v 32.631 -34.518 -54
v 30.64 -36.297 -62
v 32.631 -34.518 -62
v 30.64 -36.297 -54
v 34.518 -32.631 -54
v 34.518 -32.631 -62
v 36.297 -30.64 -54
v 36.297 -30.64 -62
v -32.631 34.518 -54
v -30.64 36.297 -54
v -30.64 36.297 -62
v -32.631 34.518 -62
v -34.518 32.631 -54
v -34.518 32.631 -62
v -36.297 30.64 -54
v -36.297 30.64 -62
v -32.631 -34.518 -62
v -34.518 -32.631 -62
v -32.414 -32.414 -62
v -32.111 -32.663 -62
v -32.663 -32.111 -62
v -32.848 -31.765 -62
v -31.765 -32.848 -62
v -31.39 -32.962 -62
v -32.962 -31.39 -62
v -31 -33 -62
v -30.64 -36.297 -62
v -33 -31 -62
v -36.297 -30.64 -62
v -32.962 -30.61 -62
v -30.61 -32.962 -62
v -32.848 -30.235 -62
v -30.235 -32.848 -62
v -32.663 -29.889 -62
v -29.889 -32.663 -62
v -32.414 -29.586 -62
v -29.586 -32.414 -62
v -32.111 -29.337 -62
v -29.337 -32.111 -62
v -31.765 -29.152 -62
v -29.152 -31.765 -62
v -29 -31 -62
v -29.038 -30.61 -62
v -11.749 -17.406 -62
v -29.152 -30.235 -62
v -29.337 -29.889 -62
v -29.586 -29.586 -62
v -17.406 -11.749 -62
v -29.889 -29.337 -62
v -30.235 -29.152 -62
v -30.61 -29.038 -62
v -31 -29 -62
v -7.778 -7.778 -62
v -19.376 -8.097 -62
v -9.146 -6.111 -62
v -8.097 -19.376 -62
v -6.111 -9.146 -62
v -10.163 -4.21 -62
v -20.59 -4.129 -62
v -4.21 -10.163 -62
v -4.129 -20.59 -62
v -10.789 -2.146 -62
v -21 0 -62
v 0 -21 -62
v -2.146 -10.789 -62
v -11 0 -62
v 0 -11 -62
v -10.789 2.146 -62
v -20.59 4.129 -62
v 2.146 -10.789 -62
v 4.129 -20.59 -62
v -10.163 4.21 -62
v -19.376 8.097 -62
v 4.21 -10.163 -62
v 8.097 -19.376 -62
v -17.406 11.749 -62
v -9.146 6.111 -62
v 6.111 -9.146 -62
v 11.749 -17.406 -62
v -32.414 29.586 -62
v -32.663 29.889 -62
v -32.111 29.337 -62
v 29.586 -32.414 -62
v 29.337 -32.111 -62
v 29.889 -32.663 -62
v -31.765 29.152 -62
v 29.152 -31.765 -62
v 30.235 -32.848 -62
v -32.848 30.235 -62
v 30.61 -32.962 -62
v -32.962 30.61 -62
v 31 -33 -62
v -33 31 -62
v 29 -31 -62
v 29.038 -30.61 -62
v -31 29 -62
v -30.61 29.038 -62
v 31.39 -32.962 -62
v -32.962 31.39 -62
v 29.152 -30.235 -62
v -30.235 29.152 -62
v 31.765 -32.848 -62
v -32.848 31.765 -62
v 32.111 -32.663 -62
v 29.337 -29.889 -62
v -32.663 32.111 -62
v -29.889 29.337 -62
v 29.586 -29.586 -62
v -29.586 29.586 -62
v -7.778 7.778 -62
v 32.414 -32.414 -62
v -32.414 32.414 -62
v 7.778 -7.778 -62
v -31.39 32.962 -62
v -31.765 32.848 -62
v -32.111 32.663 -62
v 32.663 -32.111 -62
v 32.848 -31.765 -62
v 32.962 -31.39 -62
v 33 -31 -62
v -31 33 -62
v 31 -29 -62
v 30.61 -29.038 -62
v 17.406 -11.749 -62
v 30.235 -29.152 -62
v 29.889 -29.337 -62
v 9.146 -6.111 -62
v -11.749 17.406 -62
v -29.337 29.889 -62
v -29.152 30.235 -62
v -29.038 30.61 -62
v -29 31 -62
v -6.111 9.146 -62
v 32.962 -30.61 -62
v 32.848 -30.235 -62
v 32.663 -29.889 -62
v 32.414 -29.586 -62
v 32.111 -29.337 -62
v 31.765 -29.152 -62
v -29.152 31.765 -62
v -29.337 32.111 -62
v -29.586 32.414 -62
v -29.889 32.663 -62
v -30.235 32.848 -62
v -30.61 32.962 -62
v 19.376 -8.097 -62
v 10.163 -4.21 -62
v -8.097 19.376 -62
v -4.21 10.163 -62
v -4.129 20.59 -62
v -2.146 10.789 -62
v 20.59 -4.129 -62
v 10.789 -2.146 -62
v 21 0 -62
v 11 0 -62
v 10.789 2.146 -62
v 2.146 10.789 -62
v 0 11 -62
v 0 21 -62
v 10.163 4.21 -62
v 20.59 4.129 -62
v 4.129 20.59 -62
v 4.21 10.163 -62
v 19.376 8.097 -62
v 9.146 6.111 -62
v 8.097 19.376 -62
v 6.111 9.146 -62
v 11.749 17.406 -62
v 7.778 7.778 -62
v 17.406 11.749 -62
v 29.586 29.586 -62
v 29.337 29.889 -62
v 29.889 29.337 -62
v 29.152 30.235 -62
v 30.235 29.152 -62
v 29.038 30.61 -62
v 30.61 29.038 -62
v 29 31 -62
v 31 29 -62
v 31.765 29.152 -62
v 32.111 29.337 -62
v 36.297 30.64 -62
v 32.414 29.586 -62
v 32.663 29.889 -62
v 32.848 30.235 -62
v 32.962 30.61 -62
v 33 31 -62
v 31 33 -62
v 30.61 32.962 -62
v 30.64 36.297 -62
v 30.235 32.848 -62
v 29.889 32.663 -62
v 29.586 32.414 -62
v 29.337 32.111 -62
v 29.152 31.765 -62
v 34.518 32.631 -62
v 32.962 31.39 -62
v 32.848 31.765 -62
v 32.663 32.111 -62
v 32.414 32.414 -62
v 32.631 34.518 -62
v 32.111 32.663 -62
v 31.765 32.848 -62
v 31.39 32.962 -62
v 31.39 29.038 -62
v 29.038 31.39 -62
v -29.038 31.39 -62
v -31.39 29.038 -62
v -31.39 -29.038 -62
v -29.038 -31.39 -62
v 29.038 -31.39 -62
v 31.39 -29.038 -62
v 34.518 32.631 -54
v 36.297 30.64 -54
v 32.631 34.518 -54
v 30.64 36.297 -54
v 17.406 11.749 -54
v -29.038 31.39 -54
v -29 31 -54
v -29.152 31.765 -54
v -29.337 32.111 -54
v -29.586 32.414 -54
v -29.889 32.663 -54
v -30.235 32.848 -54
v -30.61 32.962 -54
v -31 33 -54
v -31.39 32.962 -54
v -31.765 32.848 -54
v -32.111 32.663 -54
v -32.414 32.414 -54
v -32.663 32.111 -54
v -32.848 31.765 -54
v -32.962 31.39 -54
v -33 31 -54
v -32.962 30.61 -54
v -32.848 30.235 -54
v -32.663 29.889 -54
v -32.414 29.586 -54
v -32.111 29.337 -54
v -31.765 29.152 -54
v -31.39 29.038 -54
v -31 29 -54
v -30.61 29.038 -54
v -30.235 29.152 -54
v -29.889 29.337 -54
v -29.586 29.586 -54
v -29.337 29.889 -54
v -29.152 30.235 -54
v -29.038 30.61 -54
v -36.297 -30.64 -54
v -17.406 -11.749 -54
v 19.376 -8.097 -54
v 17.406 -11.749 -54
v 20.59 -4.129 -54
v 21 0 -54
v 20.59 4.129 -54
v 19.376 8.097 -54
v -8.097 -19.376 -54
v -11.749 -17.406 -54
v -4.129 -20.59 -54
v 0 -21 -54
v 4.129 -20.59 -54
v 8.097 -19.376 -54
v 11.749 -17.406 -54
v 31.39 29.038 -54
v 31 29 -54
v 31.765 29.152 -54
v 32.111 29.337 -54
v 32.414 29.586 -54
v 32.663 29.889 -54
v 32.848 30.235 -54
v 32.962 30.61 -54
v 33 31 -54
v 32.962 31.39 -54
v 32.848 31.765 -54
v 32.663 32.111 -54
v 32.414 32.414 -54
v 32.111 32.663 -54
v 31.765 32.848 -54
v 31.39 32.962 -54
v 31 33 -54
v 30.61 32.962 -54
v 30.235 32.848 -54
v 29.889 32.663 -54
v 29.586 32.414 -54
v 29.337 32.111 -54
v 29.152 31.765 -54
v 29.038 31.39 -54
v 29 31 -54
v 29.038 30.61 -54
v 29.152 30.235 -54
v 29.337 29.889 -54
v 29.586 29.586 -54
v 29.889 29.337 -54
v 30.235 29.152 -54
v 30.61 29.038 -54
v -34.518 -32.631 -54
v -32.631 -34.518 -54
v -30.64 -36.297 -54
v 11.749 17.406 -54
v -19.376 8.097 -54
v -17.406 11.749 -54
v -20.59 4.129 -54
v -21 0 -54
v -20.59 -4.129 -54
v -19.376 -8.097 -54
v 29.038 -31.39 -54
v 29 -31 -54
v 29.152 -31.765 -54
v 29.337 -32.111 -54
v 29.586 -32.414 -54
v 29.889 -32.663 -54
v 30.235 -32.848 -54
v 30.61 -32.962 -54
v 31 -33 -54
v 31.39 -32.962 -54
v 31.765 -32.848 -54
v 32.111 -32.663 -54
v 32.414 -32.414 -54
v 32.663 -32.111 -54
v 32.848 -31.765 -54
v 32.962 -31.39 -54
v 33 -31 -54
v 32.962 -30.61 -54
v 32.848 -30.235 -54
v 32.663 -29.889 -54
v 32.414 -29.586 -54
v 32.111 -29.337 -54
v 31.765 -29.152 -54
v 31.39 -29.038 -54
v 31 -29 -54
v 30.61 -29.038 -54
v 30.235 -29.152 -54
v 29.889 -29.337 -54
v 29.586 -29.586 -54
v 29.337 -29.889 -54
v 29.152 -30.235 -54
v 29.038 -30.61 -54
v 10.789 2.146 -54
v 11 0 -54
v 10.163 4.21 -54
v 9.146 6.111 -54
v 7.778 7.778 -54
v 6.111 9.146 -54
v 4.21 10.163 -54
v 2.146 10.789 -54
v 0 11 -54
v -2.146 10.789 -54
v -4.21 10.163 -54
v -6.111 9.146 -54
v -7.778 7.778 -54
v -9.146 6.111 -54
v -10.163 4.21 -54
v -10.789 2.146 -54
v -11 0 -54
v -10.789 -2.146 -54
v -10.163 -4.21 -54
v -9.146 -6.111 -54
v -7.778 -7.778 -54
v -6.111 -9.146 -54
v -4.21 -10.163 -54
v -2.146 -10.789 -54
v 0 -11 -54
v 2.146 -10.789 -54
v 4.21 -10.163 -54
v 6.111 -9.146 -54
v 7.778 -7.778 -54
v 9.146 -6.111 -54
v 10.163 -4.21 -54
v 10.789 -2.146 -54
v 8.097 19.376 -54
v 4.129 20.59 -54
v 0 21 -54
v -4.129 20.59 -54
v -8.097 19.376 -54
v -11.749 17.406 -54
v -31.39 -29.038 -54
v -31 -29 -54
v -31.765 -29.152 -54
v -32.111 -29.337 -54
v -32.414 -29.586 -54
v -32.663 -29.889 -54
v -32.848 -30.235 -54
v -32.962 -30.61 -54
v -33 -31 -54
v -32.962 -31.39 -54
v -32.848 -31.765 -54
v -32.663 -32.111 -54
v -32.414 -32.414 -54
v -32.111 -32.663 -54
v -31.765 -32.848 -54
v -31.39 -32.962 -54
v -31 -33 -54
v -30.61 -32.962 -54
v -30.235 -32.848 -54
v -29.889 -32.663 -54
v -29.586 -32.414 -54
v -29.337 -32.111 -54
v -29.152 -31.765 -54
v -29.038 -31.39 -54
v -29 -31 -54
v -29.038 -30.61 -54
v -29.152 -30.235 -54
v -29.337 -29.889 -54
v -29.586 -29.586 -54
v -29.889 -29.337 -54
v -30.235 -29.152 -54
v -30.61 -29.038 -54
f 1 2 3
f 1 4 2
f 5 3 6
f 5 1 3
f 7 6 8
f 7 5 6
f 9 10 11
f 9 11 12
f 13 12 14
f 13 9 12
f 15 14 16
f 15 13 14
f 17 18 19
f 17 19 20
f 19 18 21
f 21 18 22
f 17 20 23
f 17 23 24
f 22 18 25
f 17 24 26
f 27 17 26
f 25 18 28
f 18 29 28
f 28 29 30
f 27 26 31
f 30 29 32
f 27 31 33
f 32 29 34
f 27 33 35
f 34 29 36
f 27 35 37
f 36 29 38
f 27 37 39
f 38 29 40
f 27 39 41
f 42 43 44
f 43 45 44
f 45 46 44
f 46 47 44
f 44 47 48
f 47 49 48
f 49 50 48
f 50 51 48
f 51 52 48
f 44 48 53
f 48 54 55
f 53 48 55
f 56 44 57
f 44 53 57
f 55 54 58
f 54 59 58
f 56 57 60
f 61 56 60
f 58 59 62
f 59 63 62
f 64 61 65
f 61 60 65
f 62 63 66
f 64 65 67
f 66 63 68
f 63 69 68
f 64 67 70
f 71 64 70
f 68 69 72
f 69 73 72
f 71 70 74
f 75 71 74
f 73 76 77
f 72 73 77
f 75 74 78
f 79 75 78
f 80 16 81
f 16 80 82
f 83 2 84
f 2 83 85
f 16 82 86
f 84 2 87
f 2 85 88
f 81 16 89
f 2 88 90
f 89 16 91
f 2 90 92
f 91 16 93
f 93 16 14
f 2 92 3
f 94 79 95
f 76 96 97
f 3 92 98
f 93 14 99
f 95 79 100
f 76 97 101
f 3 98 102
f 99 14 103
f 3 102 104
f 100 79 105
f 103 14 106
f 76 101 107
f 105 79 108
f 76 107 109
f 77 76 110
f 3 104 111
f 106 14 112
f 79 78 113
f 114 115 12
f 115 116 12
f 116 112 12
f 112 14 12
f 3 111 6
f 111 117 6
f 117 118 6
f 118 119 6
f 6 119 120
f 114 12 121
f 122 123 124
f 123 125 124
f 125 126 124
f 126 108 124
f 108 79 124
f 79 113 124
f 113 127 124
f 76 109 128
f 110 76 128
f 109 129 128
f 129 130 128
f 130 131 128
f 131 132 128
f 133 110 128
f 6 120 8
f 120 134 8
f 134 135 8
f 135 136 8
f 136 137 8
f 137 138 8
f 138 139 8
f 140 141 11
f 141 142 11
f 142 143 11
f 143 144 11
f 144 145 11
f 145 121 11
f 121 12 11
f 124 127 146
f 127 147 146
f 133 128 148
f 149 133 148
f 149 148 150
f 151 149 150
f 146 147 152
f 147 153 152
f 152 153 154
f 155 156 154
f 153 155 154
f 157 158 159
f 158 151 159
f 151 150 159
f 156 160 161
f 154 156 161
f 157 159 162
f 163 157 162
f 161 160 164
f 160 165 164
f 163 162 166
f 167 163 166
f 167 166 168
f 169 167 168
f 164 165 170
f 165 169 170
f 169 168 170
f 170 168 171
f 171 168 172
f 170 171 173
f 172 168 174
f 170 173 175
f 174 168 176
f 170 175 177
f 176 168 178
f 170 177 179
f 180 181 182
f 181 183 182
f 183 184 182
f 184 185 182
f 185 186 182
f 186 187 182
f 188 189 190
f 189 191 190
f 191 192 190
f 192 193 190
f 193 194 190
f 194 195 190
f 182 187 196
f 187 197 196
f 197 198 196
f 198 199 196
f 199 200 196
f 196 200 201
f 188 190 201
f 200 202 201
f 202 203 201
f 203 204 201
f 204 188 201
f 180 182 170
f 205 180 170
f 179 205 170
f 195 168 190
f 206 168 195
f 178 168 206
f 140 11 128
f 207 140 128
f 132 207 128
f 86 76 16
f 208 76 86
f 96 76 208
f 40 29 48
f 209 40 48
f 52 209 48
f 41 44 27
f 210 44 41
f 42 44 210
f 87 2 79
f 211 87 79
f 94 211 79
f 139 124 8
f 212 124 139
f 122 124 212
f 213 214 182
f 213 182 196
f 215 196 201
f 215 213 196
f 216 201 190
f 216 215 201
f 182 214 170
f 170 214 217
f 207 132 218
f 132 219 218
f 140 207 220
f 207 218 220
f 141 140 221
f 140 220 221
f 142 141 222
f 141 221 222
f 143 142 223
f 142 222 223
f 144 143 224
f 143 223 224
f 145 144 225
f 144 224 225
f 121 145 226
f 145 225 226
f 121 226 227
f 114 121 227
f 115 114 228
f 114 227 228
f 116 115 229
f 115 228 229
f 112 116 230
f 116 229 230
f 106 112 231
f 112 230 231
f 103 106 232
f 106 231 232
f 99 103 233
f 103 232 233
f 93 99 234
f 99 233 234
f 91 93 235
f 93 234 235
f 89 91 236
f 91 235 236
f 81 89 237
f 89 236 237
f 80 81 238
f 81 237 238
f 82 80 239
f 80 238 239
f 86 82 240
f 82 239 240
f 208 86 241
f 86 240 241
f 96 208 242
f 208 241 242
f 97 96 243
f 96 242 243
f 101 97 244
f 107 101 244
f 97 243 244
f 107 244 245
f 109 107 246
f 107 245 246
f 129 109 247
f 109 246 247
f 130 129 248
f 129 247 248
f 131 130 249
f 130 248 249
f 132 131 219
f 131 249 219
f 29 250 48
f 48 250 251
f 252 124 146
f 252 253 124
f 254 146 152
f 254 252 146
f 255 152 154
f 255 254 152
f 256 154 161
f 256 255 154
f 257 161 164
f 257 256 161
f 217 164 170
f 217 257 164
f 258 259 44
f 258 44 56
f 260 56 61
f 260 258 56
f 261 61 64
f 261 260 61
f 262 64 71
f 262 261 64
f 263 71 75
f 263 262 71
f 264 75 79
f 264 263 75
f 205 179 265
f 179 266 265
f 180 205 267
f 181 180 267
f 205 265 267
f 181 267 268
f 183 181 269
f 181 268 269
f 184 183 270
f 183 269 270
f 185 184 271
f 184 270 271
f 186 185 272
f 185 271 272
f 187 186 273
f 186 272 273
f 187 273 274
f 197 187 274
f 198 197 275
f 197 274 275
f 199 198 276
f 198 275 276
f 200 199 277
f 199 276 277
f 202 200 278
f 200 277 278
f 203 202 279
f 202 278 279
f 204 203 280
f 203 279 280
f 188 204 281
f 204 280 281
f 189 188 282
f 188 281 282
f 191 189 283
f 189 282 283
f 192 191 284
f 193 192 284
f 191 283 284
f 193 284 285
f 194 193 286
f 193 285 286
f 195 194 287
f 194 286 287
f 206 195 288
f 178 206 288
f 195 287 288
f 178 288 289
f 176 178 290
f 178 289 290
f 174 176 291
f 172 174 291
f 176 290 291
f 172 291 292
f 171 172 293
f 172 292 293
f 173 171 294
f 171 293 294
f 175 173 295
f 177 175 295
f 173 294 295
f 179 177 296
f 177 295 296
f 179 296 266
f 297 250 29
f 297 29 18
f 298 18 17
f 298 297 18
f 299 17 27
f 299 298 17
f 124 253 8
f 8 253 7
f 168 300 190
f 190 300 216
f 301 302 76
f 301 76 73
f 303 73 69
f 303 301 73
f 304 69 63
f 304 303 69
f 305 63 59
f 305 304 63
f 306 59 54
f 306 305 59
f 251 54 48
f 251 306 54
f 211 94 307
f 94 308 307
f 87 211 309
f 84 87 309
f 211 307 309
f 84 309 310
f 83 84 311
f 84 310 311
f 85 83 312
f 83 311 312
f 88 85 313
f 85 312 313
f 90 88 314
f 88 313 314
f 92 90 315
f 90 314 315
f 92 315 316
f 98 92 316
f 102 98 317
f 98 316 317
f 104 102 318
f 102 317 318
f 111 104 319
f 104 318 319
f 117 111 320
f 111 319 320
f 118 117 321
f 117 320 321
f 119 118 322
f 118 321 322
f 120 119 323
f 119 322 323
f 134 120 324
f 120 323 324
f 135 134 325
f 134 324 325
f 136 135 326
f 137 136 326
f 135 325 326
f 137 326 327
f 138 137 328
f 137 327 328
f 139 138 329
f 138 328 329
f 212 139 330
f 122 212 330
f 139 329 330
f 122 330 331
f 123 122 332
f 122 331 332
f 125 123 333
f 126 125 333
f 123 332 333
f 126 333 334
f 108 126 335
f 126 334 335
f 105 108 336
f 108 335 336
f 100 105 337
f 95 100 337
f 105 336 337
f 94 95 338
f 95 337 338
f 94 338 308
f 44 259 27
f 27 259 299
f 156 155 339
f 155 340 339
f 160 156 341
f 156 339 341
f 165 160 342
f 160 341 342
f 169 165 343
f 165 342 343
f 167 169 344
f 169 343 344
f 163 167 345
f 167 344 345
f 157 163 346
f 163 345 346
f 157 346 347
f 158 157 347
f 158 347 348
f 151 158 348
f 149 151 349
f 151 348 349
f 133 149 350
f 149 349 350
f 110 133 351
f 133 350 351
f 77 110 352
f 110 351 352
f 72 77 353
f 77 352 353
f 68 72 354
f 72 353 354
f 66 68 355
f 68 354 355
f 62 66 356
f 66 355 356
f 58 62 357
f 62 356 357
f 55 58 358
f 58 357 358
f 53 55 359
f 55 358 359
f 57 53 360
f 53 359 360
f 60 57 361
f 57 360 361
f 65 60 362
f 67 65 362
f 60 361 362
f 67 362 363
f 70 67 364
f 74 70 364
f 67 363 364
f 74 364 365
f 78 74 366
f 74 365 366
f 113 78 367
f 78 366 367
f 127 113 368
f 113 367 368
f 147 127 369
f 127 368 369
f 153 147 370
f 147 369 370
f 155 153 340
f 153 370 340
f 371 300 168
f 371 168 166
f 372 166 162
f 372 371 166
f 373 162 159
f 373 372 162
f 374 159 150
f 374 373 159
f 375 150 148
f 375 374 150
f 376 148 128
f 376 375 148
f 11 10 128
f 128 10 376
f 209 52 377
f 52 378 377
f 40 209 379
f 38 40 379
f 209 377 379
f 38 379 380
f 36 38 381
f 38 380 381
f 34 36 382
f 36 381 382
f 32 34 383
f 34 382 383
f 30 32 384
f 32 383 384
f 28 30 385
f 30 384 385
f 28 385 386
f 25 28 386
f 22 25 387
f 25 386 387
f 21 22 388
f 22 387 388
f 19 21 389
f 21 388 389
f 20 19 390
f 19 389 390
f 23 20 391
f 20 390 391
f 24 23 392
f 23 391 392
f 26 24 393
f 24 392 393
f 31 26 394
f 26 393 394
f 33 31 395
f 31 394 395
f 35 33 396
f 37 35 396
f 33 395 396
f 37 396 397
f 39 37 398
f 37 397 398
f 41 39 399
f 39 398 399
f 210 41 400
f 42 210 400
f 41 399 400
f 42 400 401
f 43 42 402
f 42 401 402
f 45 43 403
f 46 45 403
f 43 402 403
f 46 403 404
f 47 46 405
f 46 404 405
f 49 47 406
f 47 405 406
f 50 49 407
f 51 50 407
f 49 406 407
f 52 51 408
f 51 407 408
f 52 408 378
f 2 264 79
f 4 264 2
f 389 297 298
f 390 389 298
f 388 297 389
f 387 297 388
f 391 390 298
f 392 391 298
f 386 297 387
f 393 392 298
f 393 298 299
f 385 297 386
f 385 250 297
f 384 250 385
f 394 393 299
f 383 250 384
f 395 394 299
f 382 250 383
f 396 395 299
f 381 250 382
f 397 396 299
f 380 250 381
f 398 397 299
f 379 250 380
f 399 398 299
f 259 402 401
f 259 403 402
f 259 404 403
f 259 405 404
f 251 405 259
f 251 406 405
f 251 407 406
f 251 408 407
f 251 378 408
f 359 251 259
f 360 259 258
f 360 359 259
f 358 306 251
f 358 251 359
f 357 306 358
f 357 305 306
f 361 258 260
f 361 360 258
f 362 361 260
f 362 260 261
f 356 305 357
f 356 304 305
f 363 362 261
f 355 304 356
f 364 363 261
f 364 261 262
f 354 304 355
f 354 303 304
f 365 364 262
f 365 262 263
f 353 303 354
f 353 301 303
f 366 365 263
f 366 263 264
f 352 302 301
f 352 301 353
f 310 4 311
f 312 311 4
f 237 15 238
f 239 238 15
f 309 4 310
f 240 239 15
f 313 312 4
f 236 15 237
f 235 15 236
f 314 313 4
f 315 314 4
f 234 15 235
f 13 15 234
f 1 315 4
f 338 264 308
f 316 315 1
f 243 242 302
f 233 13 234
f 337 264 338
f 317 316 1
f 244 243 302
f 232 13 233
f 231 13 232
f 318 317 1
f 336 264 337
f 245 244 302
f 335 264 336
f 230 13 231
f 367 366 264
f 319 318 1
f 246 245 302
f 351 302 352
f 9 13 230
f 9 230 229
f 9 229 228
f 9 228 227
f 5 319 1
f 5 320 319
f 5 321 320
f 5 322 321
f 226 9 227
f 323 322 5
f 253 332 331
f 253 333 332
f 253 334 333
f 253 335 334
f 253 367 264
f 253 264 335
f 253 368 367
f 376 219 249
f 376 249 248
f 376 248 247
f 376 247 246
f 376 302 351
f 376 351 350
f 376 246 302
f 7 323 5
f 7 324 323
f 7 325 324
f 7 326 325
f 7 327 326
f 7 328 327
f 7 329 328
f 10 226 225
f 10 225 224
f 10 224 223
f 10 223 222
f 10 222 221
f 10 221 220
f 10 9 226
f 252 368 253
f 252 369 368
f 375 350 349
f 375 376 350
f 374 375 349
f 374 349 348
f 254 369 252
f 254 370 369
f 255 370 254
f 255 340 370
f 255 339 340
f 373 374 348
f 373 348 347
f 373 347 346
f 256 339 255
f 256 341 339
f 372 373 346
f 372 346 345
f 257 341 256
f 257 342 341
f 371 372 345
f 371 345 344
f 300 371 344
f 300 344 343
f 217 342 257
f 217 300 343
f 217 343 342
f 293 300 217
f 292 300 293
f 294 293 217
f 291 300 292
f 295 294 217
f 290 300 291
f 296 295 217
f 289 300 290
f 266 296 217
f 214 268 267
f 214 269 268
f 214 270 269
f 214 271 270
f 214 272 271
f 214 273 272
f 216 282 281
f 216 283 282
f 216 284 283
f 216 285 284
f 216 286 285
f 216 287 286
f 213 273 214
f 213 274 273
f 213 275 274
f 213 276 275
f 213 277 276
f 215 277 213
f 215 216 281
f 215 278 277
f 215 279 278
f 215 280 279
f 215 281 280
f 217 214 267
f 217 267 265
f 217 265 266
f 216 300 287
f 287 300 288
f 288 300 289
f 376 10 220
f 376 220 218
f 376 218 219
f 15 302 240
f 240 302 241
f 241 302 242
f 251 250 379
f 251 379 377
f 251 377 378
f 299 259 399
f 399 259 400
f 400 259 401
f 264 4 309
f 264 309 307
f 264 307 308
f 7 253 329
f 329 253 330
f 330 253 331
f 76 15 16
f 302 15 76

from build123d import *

# Parameters (mm, degrees)
PAD002_DEPTH         = 4
SKETCH012_R          = 11
POCKET008_DEPTH      = 4.001
POCKET008_DEPTH_BACK = 4.001
SKETCH023_R          = 2
POCKET015_DEPTH      = 209.948575
POCKET015_DEPTH_BACK = 209.948575
POLARPATTERN_COUNT   = 4


with BuildPart() as part:
    # Sketch011 → Pad002 (new body, symmetric)
    with BuildSketch(Plane.XY):
        with BuildLine():
            ThreePointArc((17.405807, -11.748953), (21, 0), (17.405807, 11.748953))
            Line((36.296696, 30.639841), (17.405807, 11.748953))
            ThreePointArc((36.296696, 30.639841), (33.587572, 33.587572), (30.639841, 36.296696))
            Line((11.748953, 17.405807), (30.639841, 36.296696))
            ThreePointArc((11.748953, 17.405807), (0, 21), (-11.748953, 17.405807))
            Line((-30.639841, 36.296696), (-11.748953, 17.405807))
            ThreePointArc((-30.639841, 36.296696), (-33.587572, 33.587572), (-36.296696, 30.639841))
            Line((-36.296696, 30.639841), (-17.405807, 11.748953))
            ThreePointArc((-17.405807, 11.748953), (-21, 0), (-17.405807, -11.748953))
            Line((-36.296696, -30.639841), (-17.405807, -11.748953))
            ThreePointArc((-36.296696, -30.639841), (-33.587572, -33.587572), (-30.639841, -36.296696))
            Line((-11.748953, -17.405807), (-30.639841, -36.296696))
            ThreePointArc((-11.748953, -17.405807), (0, -21), (11.748953, -17.405807))
            Line((11.748953, -17.405807), (30.639841, -36.296696))
            ThreePointArc((30.639841, -36.296696), (33.587572, -33.587572), (36.296696, -30.639841))
            Line((17.405807, -11.748953), (36.296696, -30.639841))
        make_face()
    extrude(amount=PAD002_DEPTH, both=True)

    # Sketch012 → Pocket008 (cut, two sides)
    with BuildSketch(Plane.XY) as pocket008_sk:
        Circle(SKETCH012_R)
    extrude(amount=-POCKET008_DEPTH, mode=Mode.SUBTRACT)
    extrude(pocket008_sk.sketch, amount=POCKET008_DEPTH_BACK, mode=Mode.SUBTRACT)

    # Sketch023 → Pocket015 (cut, two sides)
    with BuildSketch(Plane.XY) as pocket015_sk:
        with Locations((-31, 31)):
            Circle(SKETCH023_R)
    pocket015 = extrude(amount=-POCKET015_DEPTH, mode=Mode.SUBTRACT) + extrude(pocket015_sk.sketch, amount=POCKET015_DEPTH_BACK, mode=Mode.SUBTRACT)

    # PolarPattern: Pocket015 ×4 about axis
    polarpattern_axis = Axis((0, 0, 0), (0, 0, 1))
    for i in range(1, POLARPATTERN_COUNT):
        add(pocket015.rotate(polarpattern_axis, i * 360 / POLARPATTERN_COUNT), mode=Mode.SUBTRACT)


with BuildPart() as part_1:
    # Body005 placement: moved
    add(part.part.moved(Location((0, 0, 58))))


with BuildPart() as part_2:
    # Clone003 placement: moved
    add(part_1.part.moved(Location((0, 0, 20))))


with BuildPart() as part_3:
    # Body006 placement: moved
    add(part_2.part.moved(Location((0, 0, -136))))


solid = part_3.part
